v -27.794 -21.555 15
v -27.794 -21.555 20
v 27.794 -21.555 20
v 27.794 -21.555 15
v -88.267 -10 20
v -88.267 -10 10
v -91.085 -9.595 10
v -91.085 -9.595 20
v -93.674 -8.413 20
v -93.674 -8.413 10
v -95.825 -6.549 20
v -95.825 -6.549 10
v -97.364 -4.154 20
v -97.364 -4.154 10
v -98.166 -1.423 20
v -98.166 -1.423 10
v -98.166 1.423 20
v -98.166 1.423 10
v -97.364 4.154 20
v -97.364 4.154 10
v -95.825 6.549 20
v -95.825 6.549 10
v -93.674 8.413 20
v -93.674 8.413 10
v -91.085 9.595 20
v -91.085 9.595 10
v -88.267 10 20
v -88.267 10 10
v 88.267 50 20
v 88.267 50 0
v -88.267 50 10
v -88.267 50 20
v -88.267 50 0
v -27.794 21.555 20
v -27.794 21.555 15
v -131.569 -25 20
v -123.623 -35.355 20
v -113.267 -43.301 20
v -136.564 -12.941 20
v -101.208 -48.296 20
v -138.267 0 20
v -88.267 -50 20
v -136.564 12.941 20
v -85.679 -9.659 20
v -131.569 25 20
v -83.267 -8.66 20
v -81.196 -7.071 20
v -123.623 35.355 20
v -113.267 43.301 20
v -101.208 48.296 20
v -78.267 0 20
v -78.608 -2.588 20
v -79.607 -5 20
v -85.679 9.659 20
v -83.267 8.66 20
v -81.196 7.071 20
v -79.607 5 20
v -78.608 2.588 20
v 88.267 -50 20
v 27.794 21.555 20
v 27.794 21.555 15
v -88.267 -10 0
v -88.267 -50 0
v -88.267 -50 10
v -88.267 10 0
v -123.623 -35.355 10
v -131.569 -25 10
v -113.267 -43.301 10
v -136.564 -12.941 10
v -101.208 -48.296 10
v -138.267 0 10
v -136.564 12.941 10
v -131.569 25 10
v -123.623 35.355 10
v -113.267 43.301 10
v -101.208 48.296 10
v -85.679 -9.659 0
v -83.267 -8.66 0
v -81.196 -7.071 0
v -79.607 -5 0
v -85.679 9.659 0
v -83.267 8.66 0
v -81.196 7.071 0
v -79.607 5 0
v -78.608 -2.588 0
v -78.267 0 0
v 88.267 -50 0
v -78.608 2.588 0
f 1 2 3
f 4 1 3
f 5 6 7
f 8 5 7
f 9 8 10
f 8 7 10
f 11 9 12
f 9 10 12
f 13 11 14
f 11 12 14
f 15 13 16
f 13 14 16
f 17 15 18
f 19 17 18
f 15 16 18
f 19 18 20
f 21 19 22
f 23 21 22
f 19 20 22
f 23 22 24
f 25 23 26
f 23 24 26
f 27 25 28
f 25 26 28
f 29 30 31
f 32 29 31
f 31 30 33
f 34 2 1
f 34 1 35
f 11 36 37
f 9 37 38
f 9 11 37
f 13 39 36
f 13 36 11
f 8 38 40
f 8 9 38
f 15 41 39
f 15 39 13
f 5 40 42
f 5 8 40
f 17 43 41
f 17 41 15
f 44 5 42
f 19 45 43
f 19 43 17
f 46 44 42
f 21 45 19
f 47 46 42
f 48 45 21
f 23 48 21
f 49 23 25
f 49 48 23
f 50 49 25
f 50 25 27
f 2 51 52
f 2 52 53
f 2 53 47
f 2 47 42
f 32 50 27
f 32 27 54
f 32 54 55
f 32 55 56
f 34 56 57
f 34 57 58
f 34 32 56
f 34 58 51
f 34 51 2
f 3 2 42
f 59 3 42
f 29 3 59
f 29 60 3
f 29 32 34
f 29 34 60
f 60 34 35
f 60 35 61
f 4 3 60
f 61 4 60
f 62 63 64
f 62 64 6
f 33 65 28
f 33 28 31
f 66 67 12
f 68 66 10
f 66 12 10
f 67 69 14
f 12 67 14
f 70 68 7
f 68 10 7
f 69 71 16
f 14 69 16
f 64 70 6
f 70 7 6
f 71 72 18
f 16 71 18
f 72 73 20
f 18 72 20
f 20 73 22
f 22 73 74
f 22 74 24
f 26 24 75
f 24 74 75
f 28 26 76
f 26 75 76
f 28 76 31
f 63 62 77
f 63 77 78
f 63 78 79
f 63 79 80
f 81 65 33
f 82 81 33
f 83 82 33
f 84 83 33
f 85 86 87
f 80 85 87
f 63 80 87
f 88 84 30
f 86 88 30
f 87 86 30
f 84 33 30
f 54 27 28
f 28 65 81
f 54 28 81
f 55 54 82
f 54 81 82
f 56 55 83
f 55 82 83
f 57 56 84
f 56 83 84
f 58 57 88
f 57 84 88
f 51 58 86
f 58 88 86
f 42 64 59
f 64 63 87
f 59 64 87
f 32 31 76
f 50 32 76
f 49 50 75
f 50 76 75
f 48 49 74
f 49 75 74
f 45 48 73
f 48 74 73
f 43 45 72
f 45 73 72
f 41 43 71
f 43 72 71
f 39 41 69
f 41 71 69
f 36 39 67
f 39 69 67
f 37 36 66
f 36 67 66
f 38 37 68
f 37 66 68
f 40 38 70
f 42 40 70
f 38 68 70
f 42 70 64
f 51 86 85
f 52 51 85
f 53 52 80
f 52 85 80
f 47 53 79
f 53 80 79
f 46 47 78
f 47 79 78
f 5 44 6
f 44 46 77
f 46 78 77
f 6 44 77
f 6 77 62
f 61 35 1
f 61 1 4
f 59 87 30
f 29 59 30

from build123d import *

# Parameters (mm, degrees)
F1_DEPTH = 20
F2_DEPTH = 10
F3_W     = 55.5881783366
F3_H     = 43.1093648076
F4_DEPTH = 5


with BuildPart() as f1:
    # F0 (on Top) → F1 (new body)
    with BuildSketch(Plane.XY):
        with BuildLine():
            ThreePointArc((-38.2674500346, 0), (-52.9121109753, 35.3553390593), (-88.2674500346, 50))
            Line((-88.2674500346, 50), (-88.2674500346, 10))
            ThreePointArc((-88.2674500346, 10), (-81.1963822228, 7.0710678119), (-78.2674500346, 0))
            ThreePointArc((-78.2674500346, 0), (-81.1963822228, -7.0710678119), (-88.2674500346, -10))
            Line((-88.2674500346, -10), (-88.2674500346, -50))
            ThreePointArc((-88.2674500346, -50), (-52.9121109753, -35.3553390593), (-38.2674500346, 0))
        make_face()
        with BuildLine():
            Line((88.2674500346, 50), (-88.2674500346, 50))
            ThreePointArc((-88.2674500346, 50), (-52.9121109753, 35.3553390593), (-38.2674500346, 0))
            ThreePointArc((-38.2674500346, 0), (-52.9121109753, -35.3553390593), (-88.2674500346, -50))
            Line((-88.2674500346, -50), (88.2674500346, -50))
            Line((88.2674500346, -50), (88.2674500346, 50))
        make_face()
        with BuildLine():
            Line((-88.2674500346, 10), (-88.2674500346, 50))
            ThreePointArc((-88.2674500346, 50), (-138.2674500346, 0), (-88.2674500346, -50))
            Line((-88.2674500346, -50), (-88.2674500346, -10))
            ThreePointArc((-88.2674500346, -10), (-98.2674500346, 0), (-88.2674500346, 10))
        make_face()
    extrude(amount=F1_DEPTH)

    # F0 (on Top) → F2 (cut)
    with BuildSketch(Plane.XY):
        with BuildLine():
            Line((-88.2674500346, 10), (-88.2674500346, 50))
            ThreePointArc((-88.2674500346, 50), (-138.2674500346, 0), (-88.2674500346, -50))
            Line((-88.2674500346, -50), (-88.2674500346, -10))
            ThreePointArc((-88.2674500346, -10), (-98.2674500346, 0), (-88.2674500346, 10))
        make_face()
    extrude(amount=F2_DEPTH, mode=Mode.SUBTRACT)

    # F3 (on face) → F4 (cut)
    with BuildSketch(Plane.XY.offset(20)):
        Rectangle(F3_W, F3_H)
    extrude(amount=-F4_DEPTH, mode=Mode.SUBTRACT)


solid = f1.part
